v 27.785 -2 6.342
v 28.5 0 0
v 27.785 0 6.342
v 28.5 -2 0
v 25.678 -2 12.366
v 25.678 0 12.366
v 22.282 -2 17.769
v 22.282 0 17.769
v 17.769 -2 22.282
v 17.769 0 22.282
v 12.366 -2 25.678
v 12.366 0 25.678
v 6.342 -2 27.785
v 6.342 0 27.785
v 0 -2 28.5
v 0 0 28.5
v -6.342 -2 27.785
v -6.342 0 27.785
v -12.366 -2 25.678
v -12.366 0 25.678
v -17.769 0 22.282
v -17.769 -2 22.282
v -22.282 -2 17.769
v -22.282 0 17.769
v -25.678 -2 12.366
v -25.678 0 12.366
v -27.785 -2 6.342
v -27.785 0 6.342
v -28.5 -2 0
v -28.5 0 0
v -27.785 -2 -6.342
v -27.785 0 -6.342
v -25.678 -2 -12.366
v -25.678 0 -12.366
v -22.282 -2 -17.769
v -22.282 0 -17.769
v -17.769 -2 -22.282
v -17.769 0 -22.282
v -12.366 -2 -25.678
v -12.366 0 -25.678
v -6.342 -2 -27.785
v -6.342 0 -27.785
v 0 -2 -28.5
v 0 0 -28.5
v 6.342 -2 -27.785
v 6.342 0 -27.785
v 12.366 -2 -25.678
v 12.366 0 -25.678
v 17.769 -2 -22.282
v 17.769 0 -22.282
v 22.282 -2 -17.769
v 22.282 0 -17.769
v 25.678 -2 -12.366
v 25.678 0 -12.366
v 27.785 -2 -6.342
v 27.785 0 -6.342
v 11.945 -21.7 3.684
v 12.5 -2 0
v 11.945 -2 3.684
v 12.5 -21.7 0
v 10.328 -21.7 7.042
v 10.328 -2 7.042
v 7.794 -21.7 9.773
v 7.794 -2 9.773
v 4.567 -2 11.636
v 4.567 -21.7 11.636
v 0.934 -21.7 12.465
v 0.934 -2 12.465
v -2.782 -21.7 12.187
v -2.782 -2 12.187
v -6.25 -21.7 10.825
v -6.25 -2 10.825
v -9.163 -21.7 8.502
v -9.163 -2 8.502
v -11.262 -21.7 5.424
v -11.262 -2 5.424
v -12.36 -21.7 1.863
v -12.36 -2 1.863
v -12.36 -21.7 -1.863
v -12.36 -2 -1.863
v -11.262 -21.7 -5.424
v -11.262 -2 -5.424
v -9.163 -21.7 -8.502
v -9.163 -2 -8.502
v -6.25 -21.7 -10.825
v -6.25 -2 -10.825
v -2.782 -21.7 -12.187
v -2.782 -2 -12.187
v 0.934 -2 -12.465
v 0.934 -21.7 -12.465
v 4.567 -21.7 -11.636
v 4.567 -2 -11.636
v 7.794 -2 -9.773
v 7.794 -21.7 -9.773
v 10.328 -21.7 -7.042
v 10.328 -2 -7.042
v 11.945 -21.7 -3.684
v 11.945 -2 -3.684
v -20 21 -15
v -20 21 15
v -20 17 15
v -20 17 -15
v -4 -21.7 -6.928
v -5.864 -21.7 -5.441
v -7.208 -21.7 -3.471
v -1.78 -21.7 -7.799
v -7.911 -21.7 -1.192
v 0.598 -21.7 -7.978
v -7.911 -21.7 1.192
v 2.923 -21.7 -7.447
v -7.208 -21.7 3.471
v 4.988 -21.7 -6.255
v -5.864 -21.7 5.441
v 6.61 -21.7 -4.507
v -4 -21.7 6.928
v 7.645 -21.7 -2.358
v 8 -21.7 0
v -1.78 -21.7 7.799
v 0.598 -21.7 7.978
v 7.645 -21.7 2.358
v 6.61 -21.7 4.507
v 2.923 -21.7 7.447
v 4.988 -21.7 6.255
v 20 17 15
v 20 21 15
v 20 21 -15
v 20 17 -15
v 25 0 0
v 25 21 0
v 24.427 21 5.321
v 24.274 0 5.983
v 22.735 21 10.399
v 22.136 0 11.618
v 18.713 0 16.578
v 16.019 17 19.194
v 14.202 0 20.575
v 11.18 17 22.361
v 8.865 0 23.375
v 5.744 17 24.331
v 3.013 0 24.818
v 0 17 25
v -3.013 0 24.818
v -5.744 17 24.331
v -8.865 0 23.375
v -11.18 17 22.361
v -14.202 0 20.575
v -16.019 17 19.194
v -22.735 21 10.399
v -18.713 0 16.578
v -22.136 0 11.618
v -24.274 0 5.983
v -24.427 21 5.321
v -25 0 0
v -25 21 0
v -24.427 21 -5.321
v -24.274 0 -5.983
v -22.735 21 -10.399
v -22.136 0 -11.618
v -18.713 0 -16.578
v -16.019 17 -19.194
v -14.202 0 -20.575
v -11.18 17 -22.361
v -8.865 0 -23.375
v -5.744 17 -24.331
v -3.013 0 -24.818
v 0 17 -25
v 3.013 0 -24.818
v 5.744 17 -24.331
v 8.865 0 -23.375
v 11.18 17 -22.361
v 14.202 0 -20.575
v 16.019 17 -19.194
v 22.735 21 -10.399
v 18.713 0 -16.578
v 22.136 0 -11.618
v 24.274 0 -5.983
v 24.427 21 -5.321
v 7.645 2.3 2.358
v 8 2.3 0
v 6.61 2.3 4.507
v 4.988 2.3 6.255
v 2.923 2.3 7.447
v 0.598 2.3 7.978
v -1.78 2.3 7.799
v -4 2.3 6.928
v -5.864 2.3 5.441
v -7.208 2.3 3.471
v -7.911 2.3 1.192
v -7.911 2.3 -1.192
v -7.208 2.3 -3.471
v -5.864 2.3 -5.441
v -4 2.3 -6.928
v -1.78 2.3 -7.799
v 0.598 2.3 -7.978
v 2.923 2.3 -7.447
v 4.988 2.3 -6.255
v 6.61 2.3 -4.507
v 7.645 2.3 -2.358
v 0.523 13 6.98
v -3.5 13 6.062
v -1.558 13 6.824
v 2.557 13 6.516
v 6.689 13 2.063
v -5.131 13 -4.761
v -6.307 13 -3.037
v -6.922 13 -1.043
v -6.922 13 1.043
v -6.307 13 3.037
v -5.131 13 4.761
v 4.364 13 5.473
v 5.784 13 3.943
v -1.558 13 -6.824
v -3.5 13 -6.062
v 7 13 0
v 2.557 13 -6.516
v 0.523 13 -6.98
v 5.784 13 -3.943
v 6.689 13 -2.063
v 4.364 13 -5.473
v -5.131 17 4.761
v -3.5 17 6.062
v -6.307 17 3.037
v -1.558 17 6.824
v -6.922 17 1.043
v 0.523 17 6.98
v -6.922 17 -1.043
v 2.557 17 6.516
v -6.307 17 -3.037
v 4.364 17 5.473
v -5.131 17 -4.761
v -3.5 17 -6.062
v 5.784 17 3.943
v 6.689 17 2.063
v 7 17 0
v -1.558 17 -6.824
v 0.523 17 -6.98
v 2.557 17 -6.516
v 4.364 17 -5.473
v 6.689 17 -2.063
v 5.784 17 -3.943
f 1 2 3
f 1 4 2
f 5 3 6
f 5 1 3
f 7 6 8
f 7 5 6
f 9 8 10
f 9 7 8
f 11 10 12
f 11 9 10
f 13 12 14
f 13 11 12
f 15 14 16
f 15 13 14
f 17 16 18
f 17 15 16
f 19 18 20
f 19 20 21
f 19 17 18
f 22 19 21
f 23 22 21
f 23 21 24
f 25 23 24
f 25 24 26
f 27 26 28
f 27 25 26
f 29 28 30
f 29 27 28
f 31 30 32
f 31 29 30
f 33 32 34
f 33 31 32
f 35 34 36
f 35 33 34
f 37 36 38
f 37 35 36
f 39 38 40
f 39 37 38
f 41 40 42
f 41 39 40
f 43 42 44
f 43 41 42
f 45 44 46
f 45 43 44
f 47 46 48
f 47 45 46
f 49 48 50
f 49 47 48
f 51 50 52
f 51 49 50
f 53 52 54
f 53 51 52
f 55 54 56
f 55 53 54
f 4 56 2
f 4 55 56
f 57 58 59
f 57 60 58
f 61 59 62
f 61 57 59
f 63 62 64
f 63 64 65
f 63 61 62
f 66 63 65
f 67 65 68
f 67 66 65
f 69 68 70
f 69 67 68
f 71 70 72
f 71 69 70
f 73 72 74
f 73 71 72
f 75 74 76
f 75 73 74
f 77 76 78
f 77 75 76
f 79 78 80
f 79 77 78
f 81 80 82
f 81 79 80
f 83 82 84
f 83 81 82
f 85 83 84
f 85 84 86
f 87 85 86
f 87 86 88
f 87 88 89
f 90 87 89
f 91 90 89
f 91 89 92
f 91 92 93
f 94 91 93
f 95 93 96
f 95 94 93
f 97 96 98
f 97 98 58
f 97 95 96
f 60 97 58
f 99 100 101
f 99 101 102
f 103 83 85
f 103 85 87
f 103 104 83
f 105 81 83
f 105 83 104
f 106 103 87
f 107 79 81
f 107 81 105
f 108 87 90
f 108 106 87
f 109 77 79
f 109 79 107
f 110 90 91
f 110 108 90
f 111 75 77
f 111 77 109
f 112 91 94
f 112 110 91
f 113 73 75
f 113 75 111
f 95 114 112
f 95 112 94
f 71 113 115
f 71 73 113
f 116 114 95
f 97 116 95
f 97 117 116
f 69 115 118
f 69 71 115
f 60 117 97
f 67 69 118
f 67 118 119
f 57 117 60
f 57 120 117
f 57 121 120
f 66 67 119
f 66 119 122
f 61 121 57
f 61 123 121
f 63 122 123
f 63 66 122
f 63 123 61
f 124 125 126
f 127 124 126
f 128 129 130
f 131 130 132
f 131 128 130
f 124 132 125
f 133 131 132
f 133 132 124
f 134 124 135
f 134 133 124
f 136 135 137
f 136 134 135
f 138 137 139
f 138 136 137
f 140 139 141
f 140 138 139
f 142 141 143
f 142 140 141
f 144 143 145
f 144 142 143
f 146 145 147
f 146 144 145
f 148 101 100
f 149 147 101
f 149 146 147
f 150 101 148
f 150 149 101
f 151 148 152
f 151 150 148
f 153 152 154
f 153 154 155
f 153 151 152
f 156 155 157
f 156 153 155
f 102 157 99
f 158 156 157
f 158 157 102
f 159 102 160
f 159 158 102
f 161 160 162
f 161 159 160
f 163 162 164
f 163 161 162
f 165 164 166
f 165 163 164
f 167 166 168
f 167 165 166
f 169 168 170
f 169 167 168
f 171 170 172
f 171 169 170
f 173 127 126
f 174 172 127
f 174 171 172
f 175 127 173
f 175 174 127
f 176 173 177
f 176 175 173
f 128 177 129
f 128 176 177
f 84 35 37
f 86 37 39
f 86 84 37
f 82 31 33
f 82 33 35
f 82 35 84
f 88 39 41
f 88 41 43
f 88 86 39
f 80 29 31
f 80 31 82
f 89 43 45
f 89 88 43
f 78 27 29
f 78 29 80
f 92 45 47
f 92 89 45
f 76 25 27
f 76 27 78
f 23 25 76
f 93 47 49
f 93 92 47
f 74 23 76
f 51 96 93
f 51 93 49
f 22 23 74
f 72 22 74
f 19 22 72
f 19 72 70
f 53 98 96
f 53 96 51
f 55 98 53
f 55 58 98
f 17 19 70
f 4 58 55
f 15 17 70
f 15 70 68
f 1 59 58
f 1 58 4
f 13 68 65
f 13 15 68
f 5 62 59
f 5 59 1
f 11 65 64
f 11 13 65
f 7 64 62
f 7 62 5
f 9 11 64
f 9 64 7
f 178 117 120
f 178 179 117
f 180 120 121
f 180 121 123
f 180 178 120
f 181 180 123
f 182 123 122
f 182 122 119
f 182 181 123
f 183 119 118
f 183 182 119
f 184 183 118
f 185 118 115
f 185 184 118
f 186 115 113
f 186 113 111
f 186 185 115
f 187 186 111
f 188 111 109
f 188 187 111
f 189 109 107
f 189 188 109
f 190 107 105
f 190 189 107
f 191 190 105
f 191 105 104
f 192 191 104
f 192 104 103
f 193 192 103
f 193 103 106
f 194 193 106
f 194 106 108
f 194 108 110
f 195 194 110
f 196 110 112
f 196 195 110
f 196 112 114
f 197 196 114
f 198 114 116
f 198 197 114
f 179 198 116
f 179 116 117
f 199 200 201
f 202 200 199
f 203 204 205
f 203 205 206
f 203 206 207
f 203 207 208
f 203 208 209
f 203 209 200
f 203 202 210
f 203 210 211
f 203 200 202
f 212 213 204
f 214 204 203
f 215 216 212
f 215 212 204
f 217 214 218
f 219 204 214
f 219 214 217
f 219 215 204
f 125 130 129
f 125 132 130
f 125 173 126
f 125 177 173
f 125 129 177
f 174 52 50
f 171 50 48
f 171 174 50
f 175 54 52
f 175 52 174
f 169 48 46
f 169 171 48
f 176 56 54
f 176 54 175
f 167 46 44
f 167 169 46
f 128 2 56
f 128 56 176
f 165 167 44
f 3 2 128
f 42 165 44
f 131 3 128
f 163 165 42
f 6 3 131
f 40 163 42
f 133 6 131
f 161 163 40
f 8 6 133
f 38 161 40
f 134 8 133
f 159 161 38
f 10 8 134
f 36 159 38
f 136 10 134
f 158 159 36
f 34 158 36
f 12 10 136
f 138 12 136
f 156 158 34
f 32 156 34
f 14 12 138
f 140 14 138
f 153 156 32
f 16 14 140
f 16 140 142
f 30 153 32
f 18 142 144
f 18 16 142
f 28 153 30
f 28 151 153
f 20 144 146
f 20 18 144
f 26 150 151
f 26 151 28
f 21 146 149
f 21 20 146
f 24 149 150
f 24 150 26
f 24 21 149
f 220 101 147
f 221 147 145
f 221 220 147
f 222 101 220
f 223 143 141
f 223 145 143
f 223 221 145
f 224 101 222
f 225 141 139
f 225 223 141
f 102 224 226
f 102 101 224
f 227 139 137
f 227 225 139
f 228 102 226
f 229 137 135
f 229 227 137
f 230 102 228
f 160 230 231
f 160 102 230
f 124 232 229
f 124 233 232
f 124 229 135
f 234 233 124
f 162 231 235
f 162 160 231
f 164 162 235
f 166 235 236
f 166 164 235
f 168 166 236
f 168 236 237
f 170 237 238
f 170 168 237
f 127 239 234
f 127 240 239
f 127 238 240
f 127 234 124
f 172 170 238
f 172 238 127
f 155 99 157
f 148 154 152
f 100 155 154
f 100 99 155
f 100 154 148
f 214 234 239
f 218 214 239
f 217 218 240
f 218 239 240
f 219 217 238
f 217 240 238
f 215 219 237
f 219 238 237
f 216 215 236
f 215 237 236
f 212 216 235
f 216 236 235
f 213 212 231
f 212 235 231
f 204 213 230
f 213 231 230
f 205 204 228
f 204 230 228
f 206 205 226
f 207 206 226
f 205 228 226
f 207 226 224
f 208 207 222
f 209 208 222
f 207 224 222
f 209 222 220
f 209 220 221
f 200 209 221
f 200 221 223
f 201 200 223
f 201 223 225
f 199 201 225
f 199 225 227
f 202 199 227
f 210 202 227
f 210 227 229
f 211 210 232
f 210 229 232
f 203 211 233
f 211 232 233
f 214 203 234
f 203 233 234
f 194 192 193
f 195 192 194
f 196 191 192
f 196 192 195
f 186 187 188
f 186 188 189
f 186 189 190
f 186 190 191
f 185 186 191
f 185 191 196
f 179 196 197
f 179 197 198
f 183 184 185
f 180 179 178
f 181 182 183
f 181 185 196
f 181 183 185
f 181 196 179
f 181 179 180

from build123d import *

# Parameters (mm, degrees)
SKETCH_2_W          = 40
SKETCH_2_H          = 57
CUT_EXTRUDE_1_DEPTH = 4
SKETCH_3_R          = 7
CUT_EXTRUDE_3_DEPTH = 4


with BuildPart() as part:
    # 草圖1 → 旋轉1 (revolve)
    with BuildSketch(Plane.XY):
        Polygon((0, 21), (25, 21), (25, 0), (28.5, 0), (28.5, -2), (12.5, -2), (12.5, -21.7), (8, -21.7), (8, 2.3), (0, 2.3), align=None)
    revolve(axis=Axis((0, 41.921070153, 0), (0, -1, 0)))

    # 草圖2 → 除料-伸長1 (cut)
    with BuildSketch(Plane(origin=(0, 21, 0), x_dir=(1, 0, 0), z_dir=(0, 1, 0))):
        Rectangle(SKETCH_2_W, SKETCH_2_H)
    extrude(amount=-CUT_EXTRUDE_1_DEPTH, mode=Mode.SUBTRACT)

    # 草圖3 → 除料-伸長3 (cut)
    with BuildSketch(Plane(origin=(0, 17, 0), x_dir=(1, 0, 0), z_dir=(0, 1, 0))):
        Circle(SKETCH_3_R)
    extrude(amount=-CUT_EXTRUDE_3_DEPTH, mode=Mode.SUBTRACT)


solid = part.part
